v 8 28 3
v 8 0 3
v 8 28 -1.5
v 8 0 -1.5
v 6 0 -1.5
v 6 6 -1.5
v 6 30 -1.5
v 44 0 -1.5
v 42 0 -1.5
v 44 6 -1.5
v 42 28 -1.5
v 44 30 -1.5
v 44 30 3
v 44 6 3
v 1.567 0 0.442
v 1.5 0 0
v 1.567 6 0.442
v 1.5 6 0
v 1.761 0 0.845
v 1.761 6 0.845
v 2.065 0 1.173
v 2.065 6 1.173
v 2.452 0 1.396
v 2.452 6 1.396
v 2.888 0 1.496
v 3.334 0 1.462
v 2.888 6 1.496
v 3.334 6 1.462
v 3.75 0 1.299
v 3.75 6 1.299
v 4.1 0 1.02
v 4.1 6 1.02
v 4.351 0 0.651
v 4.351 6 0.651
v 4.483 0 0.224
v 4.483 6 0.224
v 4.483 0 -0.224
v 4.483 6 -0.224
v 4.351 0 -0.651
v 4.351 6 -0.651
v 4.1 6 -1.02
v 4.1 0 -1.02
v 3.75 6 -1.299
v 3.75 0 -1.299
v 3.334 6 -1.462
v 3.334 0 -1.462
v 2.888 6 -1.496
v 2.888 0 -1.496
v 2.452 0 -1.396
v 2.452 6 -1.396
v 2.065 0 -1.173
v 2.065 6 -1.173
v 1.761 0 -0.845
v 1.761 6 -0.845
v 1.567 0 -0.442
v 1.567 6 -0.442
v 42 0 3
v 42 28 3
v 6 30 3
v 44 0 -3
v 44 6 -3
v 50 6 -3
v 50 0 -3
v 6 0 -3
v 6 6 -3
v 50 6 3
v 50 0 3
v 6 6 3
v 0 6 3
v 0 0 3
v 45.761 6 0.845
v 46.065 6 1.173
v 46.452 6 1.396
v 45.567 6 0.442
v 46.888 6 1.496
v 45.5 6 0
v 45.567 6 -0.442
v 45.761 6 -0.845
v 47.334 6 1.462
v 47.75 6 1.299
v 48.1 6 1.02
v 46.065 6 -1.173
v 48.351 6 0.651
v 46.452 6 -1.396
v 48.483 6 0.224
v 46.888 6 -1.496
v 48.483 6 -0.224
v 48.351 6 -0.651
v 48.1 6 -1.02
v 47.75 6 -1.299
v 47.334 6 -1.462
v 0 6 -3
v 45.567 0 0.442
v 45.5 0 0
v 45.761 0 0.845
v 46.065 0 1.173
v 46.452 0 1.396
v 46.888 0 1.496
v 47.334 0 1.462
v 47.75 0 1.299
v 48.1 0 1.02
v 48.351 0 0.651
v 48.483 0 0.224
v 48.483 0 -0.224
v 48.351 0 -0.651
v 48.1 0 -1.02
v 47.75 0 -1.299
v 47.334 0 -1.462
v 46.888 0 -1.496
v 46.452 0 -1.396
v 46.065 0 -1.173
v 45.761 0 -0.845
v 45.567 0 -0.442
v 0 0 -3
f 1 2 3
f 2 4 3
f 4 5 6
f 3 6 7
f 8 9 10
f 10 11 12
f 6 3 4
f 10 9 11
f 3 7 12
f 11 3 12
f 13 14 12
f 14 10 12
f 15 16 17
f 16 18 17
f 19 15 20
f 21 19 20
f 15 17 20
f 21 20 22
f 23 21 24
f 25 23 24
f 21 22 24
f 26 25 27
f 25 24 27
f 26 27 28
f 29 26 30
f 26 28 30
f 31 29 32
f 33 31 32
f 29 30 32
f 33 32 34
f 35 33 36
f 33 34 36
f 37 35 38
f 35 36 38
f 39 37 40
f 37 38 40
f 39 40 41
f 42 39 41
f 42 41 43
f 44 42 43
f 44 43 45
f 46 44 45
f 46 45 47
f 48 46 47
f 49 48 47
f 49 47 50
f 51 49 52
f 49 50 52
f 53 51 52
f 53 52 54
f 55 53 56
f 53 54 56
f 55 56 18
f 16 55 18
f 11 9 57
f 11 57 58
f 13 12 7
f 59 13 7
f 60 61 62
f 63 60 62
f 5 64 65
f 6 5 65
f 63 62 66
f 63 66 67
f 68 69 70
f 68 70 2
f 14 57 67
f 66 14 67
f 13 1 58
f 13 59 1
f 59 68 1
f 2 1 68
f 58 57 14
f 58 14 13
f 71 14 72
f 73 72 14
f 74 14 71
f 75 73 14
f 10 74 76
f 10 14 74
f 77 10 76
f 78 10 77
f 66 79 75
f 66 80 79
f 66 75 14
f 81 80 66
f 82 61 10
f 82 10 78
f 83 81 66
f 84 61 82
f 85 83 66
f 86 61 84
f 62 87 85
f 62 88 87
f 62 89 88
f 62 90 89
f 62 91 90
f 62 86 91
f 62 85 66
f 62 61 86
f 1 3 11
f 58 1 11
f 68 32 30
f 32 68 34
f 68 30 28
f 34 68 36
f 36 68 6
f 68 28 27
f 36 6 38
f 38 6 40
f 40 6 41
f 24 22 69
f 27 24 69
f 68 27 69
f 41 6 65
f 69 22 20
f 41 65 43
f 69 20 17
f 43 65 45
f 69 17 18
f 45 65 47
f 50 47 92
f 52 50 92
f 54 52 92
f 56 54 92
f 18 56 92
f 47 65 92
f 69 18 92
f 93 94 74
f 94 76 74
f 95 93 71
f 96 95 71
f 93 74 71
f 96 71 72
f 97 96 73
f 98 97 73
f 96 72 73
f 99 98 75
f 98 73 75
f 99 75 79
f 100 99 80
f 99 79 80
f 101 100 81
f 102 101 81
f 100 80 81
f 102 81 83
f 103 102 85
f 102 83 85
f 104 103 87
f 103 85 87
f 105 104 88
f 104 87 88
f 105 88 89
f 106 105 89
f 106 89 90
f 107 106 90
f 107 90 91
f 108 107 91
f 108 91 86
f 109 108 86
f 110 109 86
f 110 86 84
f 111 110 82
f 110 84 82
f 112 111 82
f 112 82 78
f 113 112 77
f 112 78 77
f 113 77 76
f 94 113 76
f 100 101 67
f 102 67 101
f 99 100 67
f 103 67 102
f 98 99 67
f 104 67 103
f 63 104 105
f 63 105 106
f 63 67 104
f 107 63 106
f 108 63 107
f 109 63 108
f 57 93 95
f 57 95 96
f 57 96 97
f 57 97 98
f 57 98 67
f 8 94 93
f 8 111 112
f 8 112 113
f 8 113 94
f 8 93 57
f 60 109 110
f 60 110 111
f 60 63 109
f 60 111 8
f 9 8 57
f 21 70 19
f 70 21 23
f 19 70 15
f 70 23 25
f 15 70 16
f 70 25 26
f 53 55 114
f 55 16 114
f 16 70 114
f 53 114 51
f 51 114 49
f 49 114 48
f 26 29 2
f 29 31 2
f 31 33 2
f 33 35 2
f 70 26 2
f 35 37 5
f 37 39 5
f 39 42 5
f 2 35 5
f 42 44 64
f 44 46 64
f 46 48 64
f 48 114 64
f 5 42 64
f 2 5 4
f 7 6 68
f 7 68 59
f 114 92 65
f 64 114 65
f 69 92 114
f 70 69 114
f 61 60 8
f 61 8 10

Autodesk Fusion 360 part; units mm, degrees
sketch "Sketch1" plane through (0, 0, 0) normal (0, 0, 1) x (1, 0, 0)
  line L0 (0, 0) -> (6, 0)
  line L1 (6, 0) -> (6, 6)
  line L2 (6, 6) -> (0, 6)
  line L3 (0, 6) -> (0, 0)
  line L4 (6, 0) -> (8, 0)
  line L5 (8, 0) -> (8, 30)
  line L6 (8, 30) -> (6, 30)
  line L7 (6, 30) -> (6, 0)
  line L8 (6, 30) -> (25, 30)
  line L9 (25, 30) -> (25, 28)
  line L10 (25, 28) -> (6, 28)
  line L11 (6, 28) -> (6, 30)
  line L12 (50, 6) -> (50, 0)
  line L13 (44, 6) -> (50, 6)
  line L14 (44, 0) -> (42, 0)
  line L15 (50, 0) -> (44, 0)
  line L16 (44, 30) -> (25, 30)
  line L17 (42, 0) -> (42, 30)
  line L18 (44, 0) -> (44, 6)
  line L19 (44, 30) -> (44, 0)
  line L20 (25, 28) -> (44, 28)
  line L21 (44, 28) -> (44, 30)
  line L22 (42, 30) -> (44, 30)
  point P0 (50, 0)
  dimension "d1" = 6
  dimension "d2" = 6
  dimension "d3" = 2
  dimension "d4" = 30
  dimension "d5" = 19
  dimension "d6" = 2
extrude "Extrude1" add sketch "Sketch1" along normal blind 3 and the other way blind 3 contours L0 L1 L2 L3 L7 | L12 L13 L15 L18 L19 makes body 1 at (0, 2, 1) makes body 2 at (46, 2, 3)
extrude "Extrude2" add sketch "Sketch1" along normal blind 1.5 and the other way blind 1.5 contours L1 L4 L5 L7 L10 | L5 L6 L7 L8 L10 L11 | L5 L8 L9 L10 | L9 L16 L17 L20 | L14 L17 L18 L19 L20 | L16 L17 L19 L20 L21 L22 bodies 1 2
sketch "Sketch2" plane through (0, 6, 0) normal (0, 1, 0) x (-1, 0, 0)
  line L0 (0, -3) -> (0, 3)
  line L1 (0, 3) -> (-6, 3)
  line L2 (-6, 3) -> (-6, 1.5)
  line L3 (-6, 1.5) -> (-6, -1.5)
  line L4 (-6, -1.5) -> (-6, -3)
  line L5 (-6, -3) -> (0, -3)
  circle A0 centre (-3, 0) radius 1.5
  circle A1 centre (-47, 0) radius 1.5
  line L6 (-50, -3) -> (-50, 3)
  line L7 (-44, -3) -> (-50, -3)
  dimension "d15" = 3
  dimension "d16" = 3
  dimension "d17" = 3
  dimension "d18" = 3
  dimension "d19" = 3
  dimension "d20" = 3
extrude "Extrude3" cut sketch "Sketch2" against normal blind 18 contours A0 | A1 bodies 1
extrude "Extrude4" add 1 faces at (7.3333, 11.3333, 1.5) along direction (0, 0, 1) blind 1.5 on bodies 1 bodies 1
